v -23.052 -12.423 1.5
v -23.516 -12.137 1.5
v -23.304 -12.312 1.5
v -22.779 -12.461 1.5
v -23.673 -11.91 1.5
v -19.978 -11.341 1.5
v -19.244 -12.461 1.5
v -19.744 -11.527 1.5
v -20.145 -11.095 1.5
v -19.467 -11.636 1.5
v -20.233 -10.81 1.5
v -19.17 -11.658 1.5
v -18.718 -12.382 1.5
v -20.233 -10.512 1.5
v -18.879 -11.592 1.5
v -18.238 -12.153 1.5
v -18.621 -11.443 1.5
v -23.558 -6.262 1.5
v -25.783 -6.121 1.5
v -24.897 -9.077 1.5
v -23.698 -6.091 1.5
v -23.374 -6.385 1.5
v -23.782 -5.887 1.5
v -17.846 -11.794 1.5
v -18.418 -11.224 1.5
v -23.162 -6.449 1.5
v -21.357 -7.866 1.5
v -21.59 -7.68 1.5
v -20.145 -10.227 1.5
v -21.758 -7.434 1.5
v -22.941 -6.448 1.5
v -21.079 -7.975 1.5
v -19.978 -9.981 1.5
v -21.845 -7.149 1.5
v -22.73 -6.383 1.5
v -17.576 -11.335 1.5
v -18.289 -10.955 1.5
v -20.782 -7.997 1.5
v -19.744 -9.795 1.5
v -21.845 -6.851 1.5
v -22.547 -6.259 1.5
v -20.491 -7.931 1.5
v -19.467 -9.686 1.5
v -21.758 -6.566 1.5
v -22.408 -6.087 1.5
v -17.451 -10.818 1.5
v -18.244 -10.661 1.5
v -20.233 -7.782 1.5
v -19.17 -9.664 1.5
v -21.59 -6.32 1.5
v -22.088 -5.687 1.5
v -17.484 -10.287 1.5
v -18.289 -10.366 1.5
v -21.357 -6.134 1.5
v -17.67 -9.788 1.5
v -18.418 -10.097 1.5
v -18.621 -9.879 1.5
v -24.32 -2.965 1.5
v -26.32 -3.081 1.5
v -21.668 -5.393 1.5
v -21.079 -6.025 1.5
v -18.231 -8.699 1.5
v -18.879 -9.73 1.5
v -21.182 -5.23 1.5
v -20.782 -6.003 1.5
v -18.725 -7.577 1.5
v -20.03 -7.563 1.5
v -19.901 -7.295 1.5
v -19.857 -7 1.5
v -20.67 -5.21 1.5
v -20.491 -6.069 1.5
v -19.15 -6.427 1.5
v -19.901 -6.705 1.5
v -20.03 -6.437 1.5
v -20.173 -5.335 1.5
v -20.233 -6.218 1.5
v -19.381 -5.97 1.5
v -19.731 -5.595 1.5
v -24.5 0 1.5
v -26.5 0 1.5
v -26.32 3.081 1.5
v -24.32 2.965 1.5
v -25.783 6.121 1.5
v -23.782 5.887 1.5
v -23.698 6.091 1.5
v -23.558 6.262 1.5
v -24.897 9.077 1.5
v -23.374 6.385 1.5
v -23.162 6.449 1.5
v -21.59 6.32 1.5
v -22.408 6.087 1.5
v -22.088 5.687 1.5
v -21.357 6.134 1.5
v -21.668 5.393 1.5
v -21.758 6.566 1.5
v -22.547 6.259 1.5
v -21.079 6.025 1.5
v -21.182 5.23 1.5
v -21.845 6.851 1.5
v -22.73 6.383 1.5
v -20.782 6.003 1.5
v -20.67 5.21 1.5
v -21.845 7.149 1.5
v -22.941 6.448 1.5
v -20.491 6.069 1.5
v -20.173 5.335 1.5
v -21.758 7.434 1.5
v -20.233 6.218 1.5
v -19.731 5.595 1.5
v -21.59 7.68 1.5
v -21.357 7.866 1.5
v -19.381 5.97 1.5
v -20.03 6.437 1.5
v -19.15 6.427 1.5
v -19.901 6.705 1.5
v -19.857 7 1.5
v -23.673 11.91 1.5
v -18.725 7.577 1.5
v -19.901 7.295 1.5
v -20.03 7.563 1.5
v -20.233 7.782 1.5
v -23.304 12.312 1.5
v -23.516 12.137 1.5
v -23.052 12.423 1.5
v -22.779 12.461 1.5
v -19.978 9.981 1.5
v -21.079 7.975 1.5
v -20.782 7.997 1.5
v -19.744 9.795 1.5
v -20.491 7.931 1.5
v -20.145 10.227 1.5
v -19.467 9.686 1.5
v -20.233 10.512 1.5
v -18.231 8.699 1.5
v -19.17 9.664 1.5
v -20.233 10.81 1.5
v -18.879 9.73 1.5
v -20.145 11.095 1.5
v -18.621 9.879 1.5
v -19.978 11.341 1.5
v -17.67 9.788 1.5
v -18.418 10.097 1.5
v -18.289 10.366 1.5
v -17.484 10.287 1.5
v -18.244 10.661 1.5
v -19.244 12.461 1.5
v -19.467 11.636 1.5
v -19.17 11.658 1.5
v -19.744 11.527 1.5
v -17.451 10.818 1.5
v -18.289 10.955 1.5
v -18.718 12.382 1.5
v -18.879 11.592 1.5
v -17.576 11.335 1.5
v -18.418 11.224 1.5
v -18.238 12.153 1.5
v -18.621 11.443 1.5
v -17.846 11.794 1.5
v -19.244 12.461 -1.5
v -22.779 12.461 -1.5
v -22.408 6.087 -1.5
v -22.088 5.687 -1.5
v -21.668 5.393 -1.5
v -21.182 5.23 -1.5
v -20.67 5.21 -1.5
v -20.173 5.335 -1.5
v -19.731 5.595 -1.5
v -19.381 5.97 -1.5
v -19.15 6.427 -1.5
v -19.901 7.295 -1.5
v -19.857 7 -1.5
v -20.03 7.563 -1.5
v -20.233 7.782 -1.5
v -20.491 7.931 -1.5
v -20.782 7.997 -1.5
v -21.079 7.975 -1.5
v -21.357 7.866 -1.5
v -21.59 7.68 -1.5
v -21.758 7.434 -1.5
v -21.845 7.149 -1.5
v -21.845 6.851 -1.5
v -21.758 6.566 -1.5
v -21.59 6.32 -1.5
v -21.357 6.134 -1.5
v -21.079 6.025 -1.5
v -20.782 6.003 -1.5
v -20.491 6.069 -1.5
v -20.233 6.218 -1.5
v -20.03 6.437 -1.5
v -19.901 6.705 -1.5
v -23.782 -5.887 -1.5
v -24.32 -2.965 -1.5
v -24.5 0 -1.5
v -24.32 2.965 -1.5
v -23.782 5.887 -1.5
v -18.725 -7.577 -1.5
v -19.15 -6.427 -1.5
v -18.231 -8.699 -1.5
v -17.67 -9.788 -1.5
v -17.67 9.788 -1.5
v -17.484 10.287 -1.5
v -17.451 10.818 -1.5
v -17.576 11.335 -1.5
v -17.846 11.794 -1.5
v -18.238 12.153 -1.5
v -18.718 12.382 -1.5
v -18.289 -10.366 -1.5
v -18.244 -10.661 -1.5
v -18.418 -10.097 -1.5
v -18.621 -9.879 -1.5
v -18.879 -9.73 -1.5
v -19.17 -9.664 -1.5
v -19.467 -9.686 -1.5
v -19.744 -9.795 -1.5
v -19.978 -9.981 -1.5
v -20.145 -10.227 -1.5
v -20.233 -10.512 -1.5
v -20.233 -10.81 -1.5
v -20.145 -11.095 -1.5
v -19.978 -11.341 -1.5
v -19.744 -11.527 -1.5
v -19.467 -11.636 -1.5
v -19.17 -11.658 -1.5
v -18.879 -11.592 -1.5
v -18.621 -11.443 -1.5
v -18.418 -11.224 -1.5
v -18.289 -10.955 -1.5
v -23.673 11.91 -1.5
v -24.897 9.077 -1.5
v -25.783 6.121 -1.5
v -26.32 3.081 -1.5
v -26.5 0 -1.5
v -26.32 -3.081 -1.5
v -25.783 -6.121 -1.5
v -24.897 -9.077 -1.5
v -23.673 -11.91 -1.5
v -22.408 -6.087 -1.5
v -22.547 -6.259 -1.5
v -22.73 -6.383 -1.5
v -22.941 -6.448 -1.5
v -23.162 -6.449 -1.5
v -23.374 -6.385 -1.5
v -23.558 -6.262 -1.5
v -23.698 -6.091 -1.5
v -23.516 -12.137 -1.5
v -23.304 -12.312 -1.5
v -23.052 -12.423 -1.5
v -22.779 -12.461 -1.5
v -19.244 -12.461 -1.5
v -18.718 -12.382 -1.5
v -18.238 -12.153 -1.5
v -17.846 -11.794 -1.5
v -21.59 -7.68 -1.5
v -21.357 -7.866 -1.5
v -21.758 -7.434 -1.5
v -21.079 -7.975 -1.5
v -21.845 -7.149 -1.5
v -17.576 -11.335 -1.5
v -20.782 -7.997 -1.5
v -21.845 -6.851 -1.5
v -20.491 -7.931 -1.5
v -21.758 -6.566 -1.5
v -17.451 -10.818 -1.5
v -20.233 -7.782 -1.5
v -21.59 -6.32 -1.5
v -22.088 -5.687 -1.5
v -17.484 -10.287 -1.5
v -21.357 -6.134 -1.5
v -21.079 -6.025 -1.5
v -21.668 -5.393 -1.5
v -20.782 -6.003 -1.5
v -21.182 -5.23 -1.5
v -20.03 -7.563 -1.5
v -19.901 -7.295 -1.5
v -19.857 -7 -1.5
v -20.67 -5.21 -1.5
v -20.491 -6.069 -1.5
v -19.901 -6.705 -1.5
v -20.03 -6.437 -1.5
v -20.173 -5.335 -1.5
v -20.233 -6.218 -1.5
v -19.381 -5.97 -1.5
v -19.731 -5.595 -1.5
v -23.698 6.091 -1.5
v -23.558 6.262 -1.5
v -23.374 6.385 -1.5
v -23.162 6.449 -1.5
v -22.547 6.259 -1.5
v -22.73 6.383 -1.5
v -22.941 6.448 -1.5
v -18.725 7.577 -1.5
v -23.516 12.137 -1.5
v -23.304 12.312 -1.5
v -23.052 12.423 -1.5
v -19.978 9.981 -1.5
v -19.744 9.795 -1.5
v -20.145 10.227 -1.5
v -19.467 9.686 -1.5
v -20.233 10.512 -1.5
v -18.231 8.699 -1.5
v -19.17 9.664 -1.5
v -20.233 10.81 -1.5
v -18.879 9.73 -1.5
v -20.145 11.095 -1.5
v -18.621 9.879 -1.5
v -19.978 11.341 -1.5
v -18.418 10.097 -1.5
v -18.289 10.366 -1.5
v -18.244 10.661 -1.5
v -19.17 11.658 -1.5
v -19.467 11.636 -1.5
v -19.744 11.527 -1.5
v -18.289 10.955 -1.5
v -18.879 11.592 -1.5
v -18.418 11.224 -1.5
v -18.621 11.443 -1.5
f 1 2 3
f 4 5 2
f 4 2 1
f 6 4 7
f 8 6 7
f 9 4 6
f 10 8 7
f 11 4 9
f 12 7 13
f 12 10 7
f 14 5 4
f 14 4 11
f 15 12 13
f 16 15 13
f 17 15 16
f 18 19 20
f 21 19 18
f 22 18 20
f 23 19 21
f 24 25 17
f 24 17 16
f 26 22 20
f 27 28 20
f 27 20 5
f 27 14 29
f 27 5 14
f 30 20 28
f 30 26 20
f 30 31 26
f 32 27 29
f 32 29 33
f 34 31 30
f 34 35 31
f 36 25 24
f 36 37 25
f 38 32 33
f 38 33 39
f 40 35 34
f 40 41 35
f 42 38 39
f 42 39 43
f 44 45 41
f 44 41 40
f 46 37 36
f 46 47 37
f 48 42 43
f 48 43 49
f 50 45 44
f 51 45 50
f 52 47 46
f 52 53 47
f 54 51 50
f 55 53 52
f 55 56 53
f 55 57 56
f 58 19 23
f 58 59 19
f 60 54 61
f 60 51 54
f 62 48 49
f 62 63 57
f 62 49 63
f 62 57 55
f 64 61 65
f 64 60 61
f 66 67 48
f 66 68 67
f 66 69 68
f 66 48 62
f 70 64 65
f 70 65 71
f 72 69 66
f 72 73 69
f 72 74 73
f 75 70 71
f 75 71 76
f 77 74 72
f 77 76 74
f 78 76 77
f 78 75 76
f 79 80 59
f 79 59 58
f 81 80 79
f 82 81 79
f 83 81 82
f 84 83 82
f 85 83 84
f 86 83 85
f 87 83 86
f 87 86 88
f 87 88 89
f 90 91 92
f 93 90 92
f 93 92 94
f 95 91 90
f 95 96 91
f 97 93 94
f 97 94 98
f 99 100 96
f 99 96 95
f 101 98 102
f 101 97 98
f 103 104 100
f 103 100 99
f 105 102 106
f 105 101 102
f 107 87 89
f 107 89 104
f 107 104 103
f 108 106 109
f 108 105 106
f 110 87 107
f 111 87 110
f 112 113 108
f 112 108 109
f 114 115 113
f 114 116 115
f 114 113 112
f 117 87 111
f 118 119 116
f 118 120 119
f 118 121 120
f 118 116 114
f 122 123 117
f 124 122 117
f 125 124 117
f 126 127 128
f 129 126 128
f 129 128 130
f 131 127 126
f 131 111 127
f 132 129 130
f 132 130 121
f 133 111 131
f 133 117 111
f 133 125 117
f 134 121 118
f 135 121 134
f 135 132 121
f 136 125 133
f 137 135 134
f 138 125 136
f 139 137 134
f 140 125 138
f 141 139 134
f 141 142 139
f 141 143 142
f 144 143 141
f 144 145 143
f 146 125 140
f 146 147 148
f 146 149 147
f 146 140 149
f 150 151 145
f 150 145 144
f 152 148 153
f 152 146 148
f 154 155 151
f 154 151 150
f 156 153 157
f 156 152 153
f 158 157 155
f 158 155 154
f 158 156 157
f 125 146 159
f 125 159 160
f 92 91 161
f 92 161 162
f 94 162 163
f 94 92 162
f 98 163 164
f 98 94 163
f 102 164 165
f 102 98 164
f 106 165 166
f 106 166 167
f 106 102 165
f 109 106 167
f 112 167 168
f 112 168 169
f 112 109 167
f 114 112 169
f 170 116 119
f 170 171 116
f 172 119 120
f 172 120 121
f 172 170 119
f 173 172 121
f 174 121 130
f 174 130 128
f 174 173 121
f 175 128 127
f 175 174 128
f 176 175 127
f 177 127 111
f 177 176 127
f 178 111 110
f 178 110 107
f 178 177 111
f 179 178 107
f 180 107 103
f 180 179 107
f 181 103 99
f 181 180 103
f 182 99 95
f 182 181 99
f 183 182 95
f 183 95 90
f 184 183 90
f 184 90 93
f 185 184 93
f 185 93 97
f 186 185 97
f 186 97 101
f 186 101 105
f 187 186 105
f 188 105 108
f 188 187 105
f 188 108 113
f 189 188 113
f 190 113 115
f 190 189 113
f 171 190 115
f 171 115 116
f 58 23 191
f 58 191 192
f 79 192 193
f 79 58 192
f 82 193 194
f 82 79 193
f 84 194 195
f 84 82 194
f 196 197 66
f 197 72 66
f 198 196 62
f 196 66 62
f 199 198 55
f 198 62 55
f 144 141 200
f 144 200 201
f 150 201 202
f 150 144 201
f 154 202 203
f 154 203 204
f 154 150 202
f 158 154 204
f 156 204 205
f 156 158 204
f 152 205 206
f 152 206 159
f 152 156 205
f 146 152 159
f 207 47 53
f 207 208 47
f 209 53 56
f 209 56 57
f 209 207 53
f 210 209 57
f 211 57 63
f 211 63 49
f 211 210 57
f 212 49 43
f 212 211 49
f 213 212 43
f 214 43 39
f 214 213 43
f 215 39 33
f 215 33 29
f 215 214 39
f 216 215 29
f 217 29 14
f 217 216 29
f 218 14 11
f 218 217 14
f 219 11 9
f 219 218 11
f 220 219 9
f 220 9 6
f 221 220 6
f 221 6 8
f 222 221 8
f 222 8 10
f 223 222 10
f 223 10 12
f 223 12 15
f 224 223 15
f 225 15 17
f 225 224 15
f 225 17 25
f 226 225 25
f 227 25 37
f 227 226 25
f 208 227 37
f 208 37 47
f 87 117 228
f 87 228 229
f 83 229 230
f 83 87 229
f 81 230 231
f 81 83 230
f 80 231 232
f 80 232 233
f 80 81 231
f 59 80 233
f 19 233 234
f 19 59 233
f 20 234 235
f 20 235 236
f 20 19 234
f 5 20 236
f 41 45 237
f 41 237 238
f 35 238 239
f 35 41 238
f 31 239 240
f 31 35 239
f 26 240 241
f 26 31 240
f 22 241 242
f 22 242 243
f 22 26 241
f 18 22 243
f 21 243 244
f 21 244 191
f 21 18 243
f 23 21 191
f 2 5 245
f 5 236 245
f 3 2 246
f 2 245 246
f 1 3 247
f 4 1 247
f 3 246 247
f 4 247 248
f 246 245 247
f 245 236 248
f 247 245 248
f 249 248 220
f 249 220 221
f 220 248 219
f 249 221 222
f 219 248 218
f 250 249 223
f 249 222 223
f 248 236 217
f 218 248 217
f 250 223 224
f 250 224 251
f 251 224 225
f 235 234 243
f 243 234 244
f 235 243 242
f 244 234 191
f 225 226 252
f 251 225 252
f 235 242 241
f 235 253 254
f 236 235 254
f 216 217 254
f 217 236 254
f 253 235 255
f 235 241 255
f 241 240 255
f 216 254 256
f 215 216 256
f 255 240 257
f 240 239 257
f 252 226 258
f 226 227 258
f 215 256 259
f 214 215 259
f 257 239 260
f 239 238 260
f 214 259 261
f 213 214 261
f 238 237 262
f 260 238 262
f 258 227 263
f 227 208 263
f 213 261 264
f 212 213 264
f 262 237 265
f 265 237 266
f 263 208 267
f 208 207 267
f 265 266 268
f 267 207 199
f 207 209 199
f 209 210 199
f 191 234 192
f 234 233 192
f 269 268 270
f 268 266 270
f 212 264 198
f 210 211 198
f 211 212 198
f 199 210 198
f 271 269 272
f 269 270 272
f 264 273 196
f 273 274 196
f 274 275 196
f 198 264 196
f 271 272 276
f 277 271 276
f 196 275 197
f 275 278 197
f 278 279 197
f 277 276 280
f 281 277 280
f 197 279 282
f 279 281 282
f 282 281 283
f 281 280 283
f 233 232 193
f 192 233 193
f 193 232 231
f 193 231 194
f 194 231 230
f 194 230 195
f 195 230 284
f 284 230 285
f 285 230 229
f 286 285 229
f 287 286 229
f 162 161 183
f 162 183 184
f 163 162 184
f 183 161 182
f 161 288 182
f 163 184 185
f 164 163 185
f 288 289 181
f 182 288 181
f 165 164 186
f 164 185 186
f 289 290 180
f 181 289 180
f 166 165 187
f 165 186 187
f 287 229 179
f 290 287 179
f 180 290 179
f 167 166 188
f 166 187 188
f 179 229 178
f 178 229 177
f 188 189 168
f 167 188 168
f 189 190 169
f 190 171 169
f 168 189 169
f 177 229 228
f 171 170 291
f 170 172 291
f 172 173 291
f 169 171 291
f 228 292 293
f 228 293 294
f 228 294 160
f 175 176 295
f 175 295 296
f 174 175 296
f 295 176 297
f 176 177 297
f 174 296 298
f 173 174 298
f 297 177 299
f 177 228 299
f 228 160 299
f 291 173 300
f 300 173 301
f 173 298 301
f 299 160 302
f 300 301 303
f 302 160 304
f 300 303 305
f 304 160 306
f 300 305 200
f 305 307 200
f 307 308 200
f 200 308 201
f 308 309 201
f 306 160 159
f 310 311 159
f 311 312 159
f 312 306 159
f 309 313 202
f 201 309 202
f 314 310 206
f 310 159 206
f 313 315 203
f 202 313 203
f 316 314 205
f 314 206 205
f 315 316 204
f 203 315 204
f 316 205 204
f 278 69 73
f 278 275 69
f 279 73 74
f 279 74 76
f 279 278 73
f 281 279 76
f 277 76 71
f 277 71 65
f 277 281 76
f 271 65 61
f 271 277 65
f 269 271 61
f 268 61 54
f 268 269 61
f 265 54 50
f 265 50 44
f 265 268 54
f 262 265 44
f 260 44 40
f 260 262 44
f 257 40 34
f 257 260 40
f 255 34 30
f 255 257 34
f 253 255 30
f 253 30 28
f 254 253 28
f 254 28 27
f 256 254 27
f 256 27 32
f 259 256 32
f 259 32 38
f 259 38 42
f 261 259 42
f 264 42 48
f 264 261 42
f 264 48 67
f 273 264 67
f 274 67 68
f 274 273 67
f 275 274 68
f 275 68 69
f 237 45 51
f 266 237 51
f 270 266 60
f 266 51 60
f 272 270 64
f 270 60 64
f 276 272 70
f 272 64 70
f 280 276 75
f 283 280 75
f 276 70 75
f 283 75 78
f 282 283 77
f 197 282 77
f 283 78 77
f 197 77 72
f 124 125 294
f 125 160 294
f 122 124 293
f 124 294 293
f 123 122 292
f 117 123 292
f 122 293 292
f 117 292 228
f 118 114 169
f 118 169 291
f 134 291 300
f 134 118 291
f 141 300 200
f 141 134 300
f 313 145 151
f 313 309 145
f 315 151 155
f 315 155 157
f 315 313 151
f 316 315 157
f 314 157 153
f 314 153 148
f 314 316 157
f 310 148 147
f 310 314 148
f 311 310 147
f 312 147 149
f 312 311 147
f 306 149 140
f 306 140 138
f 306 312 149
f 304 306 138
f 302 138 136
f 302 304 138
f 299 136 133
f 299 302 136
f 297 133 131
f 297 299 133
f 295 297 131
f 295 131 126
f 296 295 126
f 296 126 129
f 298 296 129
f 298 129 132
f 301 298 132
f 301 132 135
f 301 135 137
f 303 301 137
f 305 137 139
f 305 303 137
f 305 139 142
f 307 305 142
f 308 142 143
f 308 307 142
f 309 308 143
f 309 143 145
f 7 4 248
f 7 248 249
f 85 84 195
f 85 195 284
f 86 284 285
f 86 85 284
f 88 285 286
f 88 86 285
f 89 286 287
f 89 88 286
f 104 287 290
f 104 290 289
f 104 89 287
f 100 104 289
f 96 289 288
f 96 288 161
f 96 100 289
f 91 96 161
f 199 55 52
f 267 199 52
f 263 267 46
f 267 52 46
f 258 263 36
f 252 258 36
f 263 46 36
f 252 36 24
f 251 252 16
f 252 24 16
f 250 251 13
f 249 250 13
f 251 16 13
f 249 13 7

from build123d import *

# Parameters (mm, degrees)
SKETCH_1_R        = 1
EXTRUDE_1_DEPTH   = 1.5
EXTRUDE_1_2_DEPTH = 1.5
EXTRUDE_2_DEPTH   = 3
FILLET_1_R        = 1


with BuildPart() as part:
    # 草图1 → 凸台-拉伸1 (new body, symmetric)
    with BuildSketch(Plane.XY):
        with BuildLine():
            ThreePointArc((-20.819004975, 11.532954168), (-21.781247924, 9.592561643), (-22.563107092, 7.572727273))
            ThreePointArc((-22.563107092, 7.572727273), (-21.429380887, 5.293546522), (-19.150200137, 6.427272727))
            ThreePointArc((-19.150200137, 6.427272727), (-18.486605381, 8.141585932), (-17.669911786, 9.788473706))
            ThreePointArc((-17.669911786, 9.788473706), (-18.372218149, 12.235260532), (-20.819004975, 11.532954168))
        make_face()
        with Locations((-19.24445838, 10.660713937)):
            Circle(SKETCH_1_R, mode=Mode.SUBTRACT)
        with Locations((-20.856653615, 7)):
            Circle(SKETCH_1_R, mode=Mode.SUBTRACT)
    extrude(amount=EXTRUDE_1_DEPTH, both=True)



with BuildPart() as body_2:
    # 草图1 → Extrude 1 2 (new body, symmetric)
    with BuildSketch(Plane.XY):
        with BuildLine():
            ThreePointArc((-20.819004975, -11.532954168), (-21.781247924, -9.592561643), (-22.563107092, -7.572727273))
            ThreePointArc((-22.563107092, -7.572727273), (-21.429380887, -5.293546522), (-19.150200137, -6.427272727))
            ThreePointArc((-19.150200137, -6.427272727), (-18.486605381, -8.141585932), (-17.669911786, -9.788473706))
            ThreePointArc((-17.669911786, -9.788473706), (-18.372218149, -12.235260532), (-20.819004975, -11.532954168))
        make_face()
        with Locations((-19.24445838, -10.660713937)):
            Circle(SKETCH_1_R, mode=Mode.SUBTRACT)
        with Locations((-20.856653615, -7)):
            Circle(SKETCH_1_R, mode=Mode.SUBTRACT)
    extrude(amount=EXTRUDE_1_2_DEPTH, both=True)


with BuildPart() as part_1:
    add(part.part)

    add(body_2.part)  # 凸台-拉伸2 merges body 2
    # 草图2 → 凸台-拉伸2 (add)
    with BuildSketch(Plane.XY.offset(1.5)):
        with BuildLine():
            Line((-19.24445838, 12.460713937), (-23.387616556, 12.460713937))
            ThreePointArc((-23.387616556, 12.460713937), (-26.5, 0), (-23.387616556, -12.460713937))
            Line((-23.387616556, -12.460713937), (-19.24445838, -12.460713937))
            ThreePointArc((-19.24445838, -12.460713937), (-20.158232856, -12.211525404), (-20.819004975, -11.532954168))
            ThreePointArc((-20.819004975, -11.532954168), (-21.781247924, -9.592561643), (-22.563107092, -7.572727273))
            ThreePointArc((-22.563107092, -7.572727273), (-22.646911391, -6.812978362), (-22.407893773, -6.086953468))
            ThreePointArc((-22.407893773, -6.086953468), (-23.162368256, -6.448682563), (-23.782272592, -5.886723226))
            ThreePointArc((-23.782272592, -5.886723226), (-24.5, 0), (-23.782272592, 5.886723226))
            ThreePointArc((-23.782272592, 5.886723226), (-23.162368256, 6.448682563), (-22.407893773, 6.086953468))
            ThreePointArc((-22.407893773, 6.086953468), (-22.646911391, 6.812978362), (-22.563107092, 7.572727273))
            ThreePointArc((-22.563107092, 7.572727273), (-21.781247924, 9.592561643), (-20.819004975, 11.532954168))
            ThreePointArc((-20.819004975, 11.532954168), (-20.158232856, 12.211525404), (-19.24445838, 12.460713937))
        make_face()
    extrude(amount=-EXTRUDE_2_DEPTH)

    # 圆角1
    fillet_1_edges = [part_1.edges().sort_by_distance(p)[0] for p in [
        (-23.387616556, -12.460713937, 0),
        (-23.387616556, 12.460713937, 0),
    ]]
    fillet(fillet_1_edges, radius=FILLET_1_R)


solid = part_1.part
